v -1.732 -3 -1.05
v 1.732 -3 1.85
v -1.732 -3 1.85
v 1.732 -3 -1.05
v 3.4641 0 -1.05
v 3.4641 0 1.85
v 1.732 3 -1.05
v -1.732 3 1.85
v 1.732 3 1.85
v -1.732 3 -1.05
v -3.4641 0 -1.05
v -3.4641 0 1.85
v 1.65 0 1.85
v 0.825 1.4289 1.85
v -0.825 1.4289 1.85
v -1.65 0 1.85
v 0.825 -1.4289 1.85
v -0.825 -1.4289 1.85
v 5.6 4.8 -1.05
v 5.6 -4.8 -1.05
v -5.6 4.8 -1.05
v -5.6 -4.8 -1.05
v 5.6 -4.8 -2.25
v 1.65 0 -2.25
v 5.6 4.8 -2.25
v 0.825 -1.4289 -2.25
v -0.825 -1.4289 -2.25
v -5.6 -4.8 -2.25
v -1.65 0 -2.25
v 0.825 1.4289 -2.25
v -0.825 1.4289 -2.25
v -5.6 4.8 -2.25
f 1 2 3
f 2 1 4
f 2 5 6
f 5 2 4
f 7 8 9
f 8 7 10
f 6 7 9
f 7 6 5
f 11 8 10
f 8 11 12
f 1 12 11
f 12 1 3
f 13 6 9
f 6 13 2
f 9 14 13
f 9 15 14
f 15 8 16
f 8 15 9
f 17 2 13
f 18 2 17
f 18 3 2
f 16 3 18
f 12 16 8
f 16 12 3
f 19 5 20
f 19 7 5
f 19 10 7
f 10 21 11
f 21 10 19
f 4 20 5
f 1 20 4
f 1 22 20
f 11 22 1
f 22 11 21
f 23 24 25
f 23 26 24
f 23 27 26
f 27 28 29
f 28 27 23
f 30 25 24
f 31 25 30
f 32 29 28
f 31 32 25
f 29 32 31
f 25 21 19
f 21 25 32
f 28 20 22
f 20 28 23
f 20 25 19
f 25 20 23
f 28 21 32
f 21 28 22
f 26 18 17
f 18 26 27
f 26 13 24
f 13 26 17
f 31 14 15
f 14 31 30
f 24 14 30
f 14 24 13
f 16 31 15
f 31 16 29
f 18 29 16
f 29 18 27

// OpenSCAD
// Parameters
screw_thread_diameter = 4.0; //[2.0:8.0:0.1]
screw_thread_pitch = 0.7; //[0.35:1.4:0.05]
across_flats = 6.0; //[3.0:12.0:0.1]
thickness = 3.7; //[1.85:7.4:0.1]
thread_tap_drill_diameter = 3.3; //[2.0:6.0:0.05]
thread_engagement_length = 3.7; //[1.85:7.4:0.1]
edge_chamfer = 0.2; //[0.1:0.8:0.05]
slot_clearance = 0.2; //[0.0:0.6:0.05]
corner_radius = 0.3; //[0.0:1.0:0.05]
nut_length = 12.0; //[6.0:24.0:0.5]
retention_width = 10.0; //[6.0:20.0:0.5]
retention_height = 1.2; //[0.6:2.4:0.1]
overlap = 0.8; //[0.5:2.0:0.1]

// T-slot nut body with hex profile
module t_slot_nut_body_hex() {
  color("DimGray") {
    cylinder(r=across_flats/(2*cos(30)), h=thickness, center=true, $fn=6);
  }
}

// Retention profile block
module t_slot_retention_profile_block() {
  color("Silver") {
    translate([0, 0, -thickness/2 - retention_height/2 + overlap])
      cube([nut_length, retention_width - 2*slot_clearance, retention_height], center=true);
  }
}

// Lead-in chamfers
module lead_in_chamfers() {
  color("Silver") {
    difference() {
      union() {
        t_slot_nut_body_hex();
        t_slot_retention_profile_block();
      }
      translate([nut_length/2 - edge_chamfer, 0, -retention_height/2 + overlap/2])
        cube([edge_chamfer*2, retention_width, thickness + retention_height + 2*edge_chamfer], center=true);
      translate([-nut_length/2 + edge_chamfer, 0, -retention_height/2 + overlap/2])
        cube([edge_chamfer*2, retention_width, thickness + retention_height + 2*edge_chamfer], center=true);
    }
  }
}

// Threaded hole for M4 screw
module threaded_hole_m4() {
  color("Black") {
    translate([0, 0, 0])
      cylinder(r=thread_tap_drill_diameter/2, h=thread_engagement_length + 2*overlap, center=true);
  }
}

// Nut and washer assembly
module nut_and_washer() {
  difference() {
    lead_in_chamfers();
    threaded_hole_m4();
  }
}

// Final assembly
module assembly() {
  nut_and_washer();
}

assembly();
